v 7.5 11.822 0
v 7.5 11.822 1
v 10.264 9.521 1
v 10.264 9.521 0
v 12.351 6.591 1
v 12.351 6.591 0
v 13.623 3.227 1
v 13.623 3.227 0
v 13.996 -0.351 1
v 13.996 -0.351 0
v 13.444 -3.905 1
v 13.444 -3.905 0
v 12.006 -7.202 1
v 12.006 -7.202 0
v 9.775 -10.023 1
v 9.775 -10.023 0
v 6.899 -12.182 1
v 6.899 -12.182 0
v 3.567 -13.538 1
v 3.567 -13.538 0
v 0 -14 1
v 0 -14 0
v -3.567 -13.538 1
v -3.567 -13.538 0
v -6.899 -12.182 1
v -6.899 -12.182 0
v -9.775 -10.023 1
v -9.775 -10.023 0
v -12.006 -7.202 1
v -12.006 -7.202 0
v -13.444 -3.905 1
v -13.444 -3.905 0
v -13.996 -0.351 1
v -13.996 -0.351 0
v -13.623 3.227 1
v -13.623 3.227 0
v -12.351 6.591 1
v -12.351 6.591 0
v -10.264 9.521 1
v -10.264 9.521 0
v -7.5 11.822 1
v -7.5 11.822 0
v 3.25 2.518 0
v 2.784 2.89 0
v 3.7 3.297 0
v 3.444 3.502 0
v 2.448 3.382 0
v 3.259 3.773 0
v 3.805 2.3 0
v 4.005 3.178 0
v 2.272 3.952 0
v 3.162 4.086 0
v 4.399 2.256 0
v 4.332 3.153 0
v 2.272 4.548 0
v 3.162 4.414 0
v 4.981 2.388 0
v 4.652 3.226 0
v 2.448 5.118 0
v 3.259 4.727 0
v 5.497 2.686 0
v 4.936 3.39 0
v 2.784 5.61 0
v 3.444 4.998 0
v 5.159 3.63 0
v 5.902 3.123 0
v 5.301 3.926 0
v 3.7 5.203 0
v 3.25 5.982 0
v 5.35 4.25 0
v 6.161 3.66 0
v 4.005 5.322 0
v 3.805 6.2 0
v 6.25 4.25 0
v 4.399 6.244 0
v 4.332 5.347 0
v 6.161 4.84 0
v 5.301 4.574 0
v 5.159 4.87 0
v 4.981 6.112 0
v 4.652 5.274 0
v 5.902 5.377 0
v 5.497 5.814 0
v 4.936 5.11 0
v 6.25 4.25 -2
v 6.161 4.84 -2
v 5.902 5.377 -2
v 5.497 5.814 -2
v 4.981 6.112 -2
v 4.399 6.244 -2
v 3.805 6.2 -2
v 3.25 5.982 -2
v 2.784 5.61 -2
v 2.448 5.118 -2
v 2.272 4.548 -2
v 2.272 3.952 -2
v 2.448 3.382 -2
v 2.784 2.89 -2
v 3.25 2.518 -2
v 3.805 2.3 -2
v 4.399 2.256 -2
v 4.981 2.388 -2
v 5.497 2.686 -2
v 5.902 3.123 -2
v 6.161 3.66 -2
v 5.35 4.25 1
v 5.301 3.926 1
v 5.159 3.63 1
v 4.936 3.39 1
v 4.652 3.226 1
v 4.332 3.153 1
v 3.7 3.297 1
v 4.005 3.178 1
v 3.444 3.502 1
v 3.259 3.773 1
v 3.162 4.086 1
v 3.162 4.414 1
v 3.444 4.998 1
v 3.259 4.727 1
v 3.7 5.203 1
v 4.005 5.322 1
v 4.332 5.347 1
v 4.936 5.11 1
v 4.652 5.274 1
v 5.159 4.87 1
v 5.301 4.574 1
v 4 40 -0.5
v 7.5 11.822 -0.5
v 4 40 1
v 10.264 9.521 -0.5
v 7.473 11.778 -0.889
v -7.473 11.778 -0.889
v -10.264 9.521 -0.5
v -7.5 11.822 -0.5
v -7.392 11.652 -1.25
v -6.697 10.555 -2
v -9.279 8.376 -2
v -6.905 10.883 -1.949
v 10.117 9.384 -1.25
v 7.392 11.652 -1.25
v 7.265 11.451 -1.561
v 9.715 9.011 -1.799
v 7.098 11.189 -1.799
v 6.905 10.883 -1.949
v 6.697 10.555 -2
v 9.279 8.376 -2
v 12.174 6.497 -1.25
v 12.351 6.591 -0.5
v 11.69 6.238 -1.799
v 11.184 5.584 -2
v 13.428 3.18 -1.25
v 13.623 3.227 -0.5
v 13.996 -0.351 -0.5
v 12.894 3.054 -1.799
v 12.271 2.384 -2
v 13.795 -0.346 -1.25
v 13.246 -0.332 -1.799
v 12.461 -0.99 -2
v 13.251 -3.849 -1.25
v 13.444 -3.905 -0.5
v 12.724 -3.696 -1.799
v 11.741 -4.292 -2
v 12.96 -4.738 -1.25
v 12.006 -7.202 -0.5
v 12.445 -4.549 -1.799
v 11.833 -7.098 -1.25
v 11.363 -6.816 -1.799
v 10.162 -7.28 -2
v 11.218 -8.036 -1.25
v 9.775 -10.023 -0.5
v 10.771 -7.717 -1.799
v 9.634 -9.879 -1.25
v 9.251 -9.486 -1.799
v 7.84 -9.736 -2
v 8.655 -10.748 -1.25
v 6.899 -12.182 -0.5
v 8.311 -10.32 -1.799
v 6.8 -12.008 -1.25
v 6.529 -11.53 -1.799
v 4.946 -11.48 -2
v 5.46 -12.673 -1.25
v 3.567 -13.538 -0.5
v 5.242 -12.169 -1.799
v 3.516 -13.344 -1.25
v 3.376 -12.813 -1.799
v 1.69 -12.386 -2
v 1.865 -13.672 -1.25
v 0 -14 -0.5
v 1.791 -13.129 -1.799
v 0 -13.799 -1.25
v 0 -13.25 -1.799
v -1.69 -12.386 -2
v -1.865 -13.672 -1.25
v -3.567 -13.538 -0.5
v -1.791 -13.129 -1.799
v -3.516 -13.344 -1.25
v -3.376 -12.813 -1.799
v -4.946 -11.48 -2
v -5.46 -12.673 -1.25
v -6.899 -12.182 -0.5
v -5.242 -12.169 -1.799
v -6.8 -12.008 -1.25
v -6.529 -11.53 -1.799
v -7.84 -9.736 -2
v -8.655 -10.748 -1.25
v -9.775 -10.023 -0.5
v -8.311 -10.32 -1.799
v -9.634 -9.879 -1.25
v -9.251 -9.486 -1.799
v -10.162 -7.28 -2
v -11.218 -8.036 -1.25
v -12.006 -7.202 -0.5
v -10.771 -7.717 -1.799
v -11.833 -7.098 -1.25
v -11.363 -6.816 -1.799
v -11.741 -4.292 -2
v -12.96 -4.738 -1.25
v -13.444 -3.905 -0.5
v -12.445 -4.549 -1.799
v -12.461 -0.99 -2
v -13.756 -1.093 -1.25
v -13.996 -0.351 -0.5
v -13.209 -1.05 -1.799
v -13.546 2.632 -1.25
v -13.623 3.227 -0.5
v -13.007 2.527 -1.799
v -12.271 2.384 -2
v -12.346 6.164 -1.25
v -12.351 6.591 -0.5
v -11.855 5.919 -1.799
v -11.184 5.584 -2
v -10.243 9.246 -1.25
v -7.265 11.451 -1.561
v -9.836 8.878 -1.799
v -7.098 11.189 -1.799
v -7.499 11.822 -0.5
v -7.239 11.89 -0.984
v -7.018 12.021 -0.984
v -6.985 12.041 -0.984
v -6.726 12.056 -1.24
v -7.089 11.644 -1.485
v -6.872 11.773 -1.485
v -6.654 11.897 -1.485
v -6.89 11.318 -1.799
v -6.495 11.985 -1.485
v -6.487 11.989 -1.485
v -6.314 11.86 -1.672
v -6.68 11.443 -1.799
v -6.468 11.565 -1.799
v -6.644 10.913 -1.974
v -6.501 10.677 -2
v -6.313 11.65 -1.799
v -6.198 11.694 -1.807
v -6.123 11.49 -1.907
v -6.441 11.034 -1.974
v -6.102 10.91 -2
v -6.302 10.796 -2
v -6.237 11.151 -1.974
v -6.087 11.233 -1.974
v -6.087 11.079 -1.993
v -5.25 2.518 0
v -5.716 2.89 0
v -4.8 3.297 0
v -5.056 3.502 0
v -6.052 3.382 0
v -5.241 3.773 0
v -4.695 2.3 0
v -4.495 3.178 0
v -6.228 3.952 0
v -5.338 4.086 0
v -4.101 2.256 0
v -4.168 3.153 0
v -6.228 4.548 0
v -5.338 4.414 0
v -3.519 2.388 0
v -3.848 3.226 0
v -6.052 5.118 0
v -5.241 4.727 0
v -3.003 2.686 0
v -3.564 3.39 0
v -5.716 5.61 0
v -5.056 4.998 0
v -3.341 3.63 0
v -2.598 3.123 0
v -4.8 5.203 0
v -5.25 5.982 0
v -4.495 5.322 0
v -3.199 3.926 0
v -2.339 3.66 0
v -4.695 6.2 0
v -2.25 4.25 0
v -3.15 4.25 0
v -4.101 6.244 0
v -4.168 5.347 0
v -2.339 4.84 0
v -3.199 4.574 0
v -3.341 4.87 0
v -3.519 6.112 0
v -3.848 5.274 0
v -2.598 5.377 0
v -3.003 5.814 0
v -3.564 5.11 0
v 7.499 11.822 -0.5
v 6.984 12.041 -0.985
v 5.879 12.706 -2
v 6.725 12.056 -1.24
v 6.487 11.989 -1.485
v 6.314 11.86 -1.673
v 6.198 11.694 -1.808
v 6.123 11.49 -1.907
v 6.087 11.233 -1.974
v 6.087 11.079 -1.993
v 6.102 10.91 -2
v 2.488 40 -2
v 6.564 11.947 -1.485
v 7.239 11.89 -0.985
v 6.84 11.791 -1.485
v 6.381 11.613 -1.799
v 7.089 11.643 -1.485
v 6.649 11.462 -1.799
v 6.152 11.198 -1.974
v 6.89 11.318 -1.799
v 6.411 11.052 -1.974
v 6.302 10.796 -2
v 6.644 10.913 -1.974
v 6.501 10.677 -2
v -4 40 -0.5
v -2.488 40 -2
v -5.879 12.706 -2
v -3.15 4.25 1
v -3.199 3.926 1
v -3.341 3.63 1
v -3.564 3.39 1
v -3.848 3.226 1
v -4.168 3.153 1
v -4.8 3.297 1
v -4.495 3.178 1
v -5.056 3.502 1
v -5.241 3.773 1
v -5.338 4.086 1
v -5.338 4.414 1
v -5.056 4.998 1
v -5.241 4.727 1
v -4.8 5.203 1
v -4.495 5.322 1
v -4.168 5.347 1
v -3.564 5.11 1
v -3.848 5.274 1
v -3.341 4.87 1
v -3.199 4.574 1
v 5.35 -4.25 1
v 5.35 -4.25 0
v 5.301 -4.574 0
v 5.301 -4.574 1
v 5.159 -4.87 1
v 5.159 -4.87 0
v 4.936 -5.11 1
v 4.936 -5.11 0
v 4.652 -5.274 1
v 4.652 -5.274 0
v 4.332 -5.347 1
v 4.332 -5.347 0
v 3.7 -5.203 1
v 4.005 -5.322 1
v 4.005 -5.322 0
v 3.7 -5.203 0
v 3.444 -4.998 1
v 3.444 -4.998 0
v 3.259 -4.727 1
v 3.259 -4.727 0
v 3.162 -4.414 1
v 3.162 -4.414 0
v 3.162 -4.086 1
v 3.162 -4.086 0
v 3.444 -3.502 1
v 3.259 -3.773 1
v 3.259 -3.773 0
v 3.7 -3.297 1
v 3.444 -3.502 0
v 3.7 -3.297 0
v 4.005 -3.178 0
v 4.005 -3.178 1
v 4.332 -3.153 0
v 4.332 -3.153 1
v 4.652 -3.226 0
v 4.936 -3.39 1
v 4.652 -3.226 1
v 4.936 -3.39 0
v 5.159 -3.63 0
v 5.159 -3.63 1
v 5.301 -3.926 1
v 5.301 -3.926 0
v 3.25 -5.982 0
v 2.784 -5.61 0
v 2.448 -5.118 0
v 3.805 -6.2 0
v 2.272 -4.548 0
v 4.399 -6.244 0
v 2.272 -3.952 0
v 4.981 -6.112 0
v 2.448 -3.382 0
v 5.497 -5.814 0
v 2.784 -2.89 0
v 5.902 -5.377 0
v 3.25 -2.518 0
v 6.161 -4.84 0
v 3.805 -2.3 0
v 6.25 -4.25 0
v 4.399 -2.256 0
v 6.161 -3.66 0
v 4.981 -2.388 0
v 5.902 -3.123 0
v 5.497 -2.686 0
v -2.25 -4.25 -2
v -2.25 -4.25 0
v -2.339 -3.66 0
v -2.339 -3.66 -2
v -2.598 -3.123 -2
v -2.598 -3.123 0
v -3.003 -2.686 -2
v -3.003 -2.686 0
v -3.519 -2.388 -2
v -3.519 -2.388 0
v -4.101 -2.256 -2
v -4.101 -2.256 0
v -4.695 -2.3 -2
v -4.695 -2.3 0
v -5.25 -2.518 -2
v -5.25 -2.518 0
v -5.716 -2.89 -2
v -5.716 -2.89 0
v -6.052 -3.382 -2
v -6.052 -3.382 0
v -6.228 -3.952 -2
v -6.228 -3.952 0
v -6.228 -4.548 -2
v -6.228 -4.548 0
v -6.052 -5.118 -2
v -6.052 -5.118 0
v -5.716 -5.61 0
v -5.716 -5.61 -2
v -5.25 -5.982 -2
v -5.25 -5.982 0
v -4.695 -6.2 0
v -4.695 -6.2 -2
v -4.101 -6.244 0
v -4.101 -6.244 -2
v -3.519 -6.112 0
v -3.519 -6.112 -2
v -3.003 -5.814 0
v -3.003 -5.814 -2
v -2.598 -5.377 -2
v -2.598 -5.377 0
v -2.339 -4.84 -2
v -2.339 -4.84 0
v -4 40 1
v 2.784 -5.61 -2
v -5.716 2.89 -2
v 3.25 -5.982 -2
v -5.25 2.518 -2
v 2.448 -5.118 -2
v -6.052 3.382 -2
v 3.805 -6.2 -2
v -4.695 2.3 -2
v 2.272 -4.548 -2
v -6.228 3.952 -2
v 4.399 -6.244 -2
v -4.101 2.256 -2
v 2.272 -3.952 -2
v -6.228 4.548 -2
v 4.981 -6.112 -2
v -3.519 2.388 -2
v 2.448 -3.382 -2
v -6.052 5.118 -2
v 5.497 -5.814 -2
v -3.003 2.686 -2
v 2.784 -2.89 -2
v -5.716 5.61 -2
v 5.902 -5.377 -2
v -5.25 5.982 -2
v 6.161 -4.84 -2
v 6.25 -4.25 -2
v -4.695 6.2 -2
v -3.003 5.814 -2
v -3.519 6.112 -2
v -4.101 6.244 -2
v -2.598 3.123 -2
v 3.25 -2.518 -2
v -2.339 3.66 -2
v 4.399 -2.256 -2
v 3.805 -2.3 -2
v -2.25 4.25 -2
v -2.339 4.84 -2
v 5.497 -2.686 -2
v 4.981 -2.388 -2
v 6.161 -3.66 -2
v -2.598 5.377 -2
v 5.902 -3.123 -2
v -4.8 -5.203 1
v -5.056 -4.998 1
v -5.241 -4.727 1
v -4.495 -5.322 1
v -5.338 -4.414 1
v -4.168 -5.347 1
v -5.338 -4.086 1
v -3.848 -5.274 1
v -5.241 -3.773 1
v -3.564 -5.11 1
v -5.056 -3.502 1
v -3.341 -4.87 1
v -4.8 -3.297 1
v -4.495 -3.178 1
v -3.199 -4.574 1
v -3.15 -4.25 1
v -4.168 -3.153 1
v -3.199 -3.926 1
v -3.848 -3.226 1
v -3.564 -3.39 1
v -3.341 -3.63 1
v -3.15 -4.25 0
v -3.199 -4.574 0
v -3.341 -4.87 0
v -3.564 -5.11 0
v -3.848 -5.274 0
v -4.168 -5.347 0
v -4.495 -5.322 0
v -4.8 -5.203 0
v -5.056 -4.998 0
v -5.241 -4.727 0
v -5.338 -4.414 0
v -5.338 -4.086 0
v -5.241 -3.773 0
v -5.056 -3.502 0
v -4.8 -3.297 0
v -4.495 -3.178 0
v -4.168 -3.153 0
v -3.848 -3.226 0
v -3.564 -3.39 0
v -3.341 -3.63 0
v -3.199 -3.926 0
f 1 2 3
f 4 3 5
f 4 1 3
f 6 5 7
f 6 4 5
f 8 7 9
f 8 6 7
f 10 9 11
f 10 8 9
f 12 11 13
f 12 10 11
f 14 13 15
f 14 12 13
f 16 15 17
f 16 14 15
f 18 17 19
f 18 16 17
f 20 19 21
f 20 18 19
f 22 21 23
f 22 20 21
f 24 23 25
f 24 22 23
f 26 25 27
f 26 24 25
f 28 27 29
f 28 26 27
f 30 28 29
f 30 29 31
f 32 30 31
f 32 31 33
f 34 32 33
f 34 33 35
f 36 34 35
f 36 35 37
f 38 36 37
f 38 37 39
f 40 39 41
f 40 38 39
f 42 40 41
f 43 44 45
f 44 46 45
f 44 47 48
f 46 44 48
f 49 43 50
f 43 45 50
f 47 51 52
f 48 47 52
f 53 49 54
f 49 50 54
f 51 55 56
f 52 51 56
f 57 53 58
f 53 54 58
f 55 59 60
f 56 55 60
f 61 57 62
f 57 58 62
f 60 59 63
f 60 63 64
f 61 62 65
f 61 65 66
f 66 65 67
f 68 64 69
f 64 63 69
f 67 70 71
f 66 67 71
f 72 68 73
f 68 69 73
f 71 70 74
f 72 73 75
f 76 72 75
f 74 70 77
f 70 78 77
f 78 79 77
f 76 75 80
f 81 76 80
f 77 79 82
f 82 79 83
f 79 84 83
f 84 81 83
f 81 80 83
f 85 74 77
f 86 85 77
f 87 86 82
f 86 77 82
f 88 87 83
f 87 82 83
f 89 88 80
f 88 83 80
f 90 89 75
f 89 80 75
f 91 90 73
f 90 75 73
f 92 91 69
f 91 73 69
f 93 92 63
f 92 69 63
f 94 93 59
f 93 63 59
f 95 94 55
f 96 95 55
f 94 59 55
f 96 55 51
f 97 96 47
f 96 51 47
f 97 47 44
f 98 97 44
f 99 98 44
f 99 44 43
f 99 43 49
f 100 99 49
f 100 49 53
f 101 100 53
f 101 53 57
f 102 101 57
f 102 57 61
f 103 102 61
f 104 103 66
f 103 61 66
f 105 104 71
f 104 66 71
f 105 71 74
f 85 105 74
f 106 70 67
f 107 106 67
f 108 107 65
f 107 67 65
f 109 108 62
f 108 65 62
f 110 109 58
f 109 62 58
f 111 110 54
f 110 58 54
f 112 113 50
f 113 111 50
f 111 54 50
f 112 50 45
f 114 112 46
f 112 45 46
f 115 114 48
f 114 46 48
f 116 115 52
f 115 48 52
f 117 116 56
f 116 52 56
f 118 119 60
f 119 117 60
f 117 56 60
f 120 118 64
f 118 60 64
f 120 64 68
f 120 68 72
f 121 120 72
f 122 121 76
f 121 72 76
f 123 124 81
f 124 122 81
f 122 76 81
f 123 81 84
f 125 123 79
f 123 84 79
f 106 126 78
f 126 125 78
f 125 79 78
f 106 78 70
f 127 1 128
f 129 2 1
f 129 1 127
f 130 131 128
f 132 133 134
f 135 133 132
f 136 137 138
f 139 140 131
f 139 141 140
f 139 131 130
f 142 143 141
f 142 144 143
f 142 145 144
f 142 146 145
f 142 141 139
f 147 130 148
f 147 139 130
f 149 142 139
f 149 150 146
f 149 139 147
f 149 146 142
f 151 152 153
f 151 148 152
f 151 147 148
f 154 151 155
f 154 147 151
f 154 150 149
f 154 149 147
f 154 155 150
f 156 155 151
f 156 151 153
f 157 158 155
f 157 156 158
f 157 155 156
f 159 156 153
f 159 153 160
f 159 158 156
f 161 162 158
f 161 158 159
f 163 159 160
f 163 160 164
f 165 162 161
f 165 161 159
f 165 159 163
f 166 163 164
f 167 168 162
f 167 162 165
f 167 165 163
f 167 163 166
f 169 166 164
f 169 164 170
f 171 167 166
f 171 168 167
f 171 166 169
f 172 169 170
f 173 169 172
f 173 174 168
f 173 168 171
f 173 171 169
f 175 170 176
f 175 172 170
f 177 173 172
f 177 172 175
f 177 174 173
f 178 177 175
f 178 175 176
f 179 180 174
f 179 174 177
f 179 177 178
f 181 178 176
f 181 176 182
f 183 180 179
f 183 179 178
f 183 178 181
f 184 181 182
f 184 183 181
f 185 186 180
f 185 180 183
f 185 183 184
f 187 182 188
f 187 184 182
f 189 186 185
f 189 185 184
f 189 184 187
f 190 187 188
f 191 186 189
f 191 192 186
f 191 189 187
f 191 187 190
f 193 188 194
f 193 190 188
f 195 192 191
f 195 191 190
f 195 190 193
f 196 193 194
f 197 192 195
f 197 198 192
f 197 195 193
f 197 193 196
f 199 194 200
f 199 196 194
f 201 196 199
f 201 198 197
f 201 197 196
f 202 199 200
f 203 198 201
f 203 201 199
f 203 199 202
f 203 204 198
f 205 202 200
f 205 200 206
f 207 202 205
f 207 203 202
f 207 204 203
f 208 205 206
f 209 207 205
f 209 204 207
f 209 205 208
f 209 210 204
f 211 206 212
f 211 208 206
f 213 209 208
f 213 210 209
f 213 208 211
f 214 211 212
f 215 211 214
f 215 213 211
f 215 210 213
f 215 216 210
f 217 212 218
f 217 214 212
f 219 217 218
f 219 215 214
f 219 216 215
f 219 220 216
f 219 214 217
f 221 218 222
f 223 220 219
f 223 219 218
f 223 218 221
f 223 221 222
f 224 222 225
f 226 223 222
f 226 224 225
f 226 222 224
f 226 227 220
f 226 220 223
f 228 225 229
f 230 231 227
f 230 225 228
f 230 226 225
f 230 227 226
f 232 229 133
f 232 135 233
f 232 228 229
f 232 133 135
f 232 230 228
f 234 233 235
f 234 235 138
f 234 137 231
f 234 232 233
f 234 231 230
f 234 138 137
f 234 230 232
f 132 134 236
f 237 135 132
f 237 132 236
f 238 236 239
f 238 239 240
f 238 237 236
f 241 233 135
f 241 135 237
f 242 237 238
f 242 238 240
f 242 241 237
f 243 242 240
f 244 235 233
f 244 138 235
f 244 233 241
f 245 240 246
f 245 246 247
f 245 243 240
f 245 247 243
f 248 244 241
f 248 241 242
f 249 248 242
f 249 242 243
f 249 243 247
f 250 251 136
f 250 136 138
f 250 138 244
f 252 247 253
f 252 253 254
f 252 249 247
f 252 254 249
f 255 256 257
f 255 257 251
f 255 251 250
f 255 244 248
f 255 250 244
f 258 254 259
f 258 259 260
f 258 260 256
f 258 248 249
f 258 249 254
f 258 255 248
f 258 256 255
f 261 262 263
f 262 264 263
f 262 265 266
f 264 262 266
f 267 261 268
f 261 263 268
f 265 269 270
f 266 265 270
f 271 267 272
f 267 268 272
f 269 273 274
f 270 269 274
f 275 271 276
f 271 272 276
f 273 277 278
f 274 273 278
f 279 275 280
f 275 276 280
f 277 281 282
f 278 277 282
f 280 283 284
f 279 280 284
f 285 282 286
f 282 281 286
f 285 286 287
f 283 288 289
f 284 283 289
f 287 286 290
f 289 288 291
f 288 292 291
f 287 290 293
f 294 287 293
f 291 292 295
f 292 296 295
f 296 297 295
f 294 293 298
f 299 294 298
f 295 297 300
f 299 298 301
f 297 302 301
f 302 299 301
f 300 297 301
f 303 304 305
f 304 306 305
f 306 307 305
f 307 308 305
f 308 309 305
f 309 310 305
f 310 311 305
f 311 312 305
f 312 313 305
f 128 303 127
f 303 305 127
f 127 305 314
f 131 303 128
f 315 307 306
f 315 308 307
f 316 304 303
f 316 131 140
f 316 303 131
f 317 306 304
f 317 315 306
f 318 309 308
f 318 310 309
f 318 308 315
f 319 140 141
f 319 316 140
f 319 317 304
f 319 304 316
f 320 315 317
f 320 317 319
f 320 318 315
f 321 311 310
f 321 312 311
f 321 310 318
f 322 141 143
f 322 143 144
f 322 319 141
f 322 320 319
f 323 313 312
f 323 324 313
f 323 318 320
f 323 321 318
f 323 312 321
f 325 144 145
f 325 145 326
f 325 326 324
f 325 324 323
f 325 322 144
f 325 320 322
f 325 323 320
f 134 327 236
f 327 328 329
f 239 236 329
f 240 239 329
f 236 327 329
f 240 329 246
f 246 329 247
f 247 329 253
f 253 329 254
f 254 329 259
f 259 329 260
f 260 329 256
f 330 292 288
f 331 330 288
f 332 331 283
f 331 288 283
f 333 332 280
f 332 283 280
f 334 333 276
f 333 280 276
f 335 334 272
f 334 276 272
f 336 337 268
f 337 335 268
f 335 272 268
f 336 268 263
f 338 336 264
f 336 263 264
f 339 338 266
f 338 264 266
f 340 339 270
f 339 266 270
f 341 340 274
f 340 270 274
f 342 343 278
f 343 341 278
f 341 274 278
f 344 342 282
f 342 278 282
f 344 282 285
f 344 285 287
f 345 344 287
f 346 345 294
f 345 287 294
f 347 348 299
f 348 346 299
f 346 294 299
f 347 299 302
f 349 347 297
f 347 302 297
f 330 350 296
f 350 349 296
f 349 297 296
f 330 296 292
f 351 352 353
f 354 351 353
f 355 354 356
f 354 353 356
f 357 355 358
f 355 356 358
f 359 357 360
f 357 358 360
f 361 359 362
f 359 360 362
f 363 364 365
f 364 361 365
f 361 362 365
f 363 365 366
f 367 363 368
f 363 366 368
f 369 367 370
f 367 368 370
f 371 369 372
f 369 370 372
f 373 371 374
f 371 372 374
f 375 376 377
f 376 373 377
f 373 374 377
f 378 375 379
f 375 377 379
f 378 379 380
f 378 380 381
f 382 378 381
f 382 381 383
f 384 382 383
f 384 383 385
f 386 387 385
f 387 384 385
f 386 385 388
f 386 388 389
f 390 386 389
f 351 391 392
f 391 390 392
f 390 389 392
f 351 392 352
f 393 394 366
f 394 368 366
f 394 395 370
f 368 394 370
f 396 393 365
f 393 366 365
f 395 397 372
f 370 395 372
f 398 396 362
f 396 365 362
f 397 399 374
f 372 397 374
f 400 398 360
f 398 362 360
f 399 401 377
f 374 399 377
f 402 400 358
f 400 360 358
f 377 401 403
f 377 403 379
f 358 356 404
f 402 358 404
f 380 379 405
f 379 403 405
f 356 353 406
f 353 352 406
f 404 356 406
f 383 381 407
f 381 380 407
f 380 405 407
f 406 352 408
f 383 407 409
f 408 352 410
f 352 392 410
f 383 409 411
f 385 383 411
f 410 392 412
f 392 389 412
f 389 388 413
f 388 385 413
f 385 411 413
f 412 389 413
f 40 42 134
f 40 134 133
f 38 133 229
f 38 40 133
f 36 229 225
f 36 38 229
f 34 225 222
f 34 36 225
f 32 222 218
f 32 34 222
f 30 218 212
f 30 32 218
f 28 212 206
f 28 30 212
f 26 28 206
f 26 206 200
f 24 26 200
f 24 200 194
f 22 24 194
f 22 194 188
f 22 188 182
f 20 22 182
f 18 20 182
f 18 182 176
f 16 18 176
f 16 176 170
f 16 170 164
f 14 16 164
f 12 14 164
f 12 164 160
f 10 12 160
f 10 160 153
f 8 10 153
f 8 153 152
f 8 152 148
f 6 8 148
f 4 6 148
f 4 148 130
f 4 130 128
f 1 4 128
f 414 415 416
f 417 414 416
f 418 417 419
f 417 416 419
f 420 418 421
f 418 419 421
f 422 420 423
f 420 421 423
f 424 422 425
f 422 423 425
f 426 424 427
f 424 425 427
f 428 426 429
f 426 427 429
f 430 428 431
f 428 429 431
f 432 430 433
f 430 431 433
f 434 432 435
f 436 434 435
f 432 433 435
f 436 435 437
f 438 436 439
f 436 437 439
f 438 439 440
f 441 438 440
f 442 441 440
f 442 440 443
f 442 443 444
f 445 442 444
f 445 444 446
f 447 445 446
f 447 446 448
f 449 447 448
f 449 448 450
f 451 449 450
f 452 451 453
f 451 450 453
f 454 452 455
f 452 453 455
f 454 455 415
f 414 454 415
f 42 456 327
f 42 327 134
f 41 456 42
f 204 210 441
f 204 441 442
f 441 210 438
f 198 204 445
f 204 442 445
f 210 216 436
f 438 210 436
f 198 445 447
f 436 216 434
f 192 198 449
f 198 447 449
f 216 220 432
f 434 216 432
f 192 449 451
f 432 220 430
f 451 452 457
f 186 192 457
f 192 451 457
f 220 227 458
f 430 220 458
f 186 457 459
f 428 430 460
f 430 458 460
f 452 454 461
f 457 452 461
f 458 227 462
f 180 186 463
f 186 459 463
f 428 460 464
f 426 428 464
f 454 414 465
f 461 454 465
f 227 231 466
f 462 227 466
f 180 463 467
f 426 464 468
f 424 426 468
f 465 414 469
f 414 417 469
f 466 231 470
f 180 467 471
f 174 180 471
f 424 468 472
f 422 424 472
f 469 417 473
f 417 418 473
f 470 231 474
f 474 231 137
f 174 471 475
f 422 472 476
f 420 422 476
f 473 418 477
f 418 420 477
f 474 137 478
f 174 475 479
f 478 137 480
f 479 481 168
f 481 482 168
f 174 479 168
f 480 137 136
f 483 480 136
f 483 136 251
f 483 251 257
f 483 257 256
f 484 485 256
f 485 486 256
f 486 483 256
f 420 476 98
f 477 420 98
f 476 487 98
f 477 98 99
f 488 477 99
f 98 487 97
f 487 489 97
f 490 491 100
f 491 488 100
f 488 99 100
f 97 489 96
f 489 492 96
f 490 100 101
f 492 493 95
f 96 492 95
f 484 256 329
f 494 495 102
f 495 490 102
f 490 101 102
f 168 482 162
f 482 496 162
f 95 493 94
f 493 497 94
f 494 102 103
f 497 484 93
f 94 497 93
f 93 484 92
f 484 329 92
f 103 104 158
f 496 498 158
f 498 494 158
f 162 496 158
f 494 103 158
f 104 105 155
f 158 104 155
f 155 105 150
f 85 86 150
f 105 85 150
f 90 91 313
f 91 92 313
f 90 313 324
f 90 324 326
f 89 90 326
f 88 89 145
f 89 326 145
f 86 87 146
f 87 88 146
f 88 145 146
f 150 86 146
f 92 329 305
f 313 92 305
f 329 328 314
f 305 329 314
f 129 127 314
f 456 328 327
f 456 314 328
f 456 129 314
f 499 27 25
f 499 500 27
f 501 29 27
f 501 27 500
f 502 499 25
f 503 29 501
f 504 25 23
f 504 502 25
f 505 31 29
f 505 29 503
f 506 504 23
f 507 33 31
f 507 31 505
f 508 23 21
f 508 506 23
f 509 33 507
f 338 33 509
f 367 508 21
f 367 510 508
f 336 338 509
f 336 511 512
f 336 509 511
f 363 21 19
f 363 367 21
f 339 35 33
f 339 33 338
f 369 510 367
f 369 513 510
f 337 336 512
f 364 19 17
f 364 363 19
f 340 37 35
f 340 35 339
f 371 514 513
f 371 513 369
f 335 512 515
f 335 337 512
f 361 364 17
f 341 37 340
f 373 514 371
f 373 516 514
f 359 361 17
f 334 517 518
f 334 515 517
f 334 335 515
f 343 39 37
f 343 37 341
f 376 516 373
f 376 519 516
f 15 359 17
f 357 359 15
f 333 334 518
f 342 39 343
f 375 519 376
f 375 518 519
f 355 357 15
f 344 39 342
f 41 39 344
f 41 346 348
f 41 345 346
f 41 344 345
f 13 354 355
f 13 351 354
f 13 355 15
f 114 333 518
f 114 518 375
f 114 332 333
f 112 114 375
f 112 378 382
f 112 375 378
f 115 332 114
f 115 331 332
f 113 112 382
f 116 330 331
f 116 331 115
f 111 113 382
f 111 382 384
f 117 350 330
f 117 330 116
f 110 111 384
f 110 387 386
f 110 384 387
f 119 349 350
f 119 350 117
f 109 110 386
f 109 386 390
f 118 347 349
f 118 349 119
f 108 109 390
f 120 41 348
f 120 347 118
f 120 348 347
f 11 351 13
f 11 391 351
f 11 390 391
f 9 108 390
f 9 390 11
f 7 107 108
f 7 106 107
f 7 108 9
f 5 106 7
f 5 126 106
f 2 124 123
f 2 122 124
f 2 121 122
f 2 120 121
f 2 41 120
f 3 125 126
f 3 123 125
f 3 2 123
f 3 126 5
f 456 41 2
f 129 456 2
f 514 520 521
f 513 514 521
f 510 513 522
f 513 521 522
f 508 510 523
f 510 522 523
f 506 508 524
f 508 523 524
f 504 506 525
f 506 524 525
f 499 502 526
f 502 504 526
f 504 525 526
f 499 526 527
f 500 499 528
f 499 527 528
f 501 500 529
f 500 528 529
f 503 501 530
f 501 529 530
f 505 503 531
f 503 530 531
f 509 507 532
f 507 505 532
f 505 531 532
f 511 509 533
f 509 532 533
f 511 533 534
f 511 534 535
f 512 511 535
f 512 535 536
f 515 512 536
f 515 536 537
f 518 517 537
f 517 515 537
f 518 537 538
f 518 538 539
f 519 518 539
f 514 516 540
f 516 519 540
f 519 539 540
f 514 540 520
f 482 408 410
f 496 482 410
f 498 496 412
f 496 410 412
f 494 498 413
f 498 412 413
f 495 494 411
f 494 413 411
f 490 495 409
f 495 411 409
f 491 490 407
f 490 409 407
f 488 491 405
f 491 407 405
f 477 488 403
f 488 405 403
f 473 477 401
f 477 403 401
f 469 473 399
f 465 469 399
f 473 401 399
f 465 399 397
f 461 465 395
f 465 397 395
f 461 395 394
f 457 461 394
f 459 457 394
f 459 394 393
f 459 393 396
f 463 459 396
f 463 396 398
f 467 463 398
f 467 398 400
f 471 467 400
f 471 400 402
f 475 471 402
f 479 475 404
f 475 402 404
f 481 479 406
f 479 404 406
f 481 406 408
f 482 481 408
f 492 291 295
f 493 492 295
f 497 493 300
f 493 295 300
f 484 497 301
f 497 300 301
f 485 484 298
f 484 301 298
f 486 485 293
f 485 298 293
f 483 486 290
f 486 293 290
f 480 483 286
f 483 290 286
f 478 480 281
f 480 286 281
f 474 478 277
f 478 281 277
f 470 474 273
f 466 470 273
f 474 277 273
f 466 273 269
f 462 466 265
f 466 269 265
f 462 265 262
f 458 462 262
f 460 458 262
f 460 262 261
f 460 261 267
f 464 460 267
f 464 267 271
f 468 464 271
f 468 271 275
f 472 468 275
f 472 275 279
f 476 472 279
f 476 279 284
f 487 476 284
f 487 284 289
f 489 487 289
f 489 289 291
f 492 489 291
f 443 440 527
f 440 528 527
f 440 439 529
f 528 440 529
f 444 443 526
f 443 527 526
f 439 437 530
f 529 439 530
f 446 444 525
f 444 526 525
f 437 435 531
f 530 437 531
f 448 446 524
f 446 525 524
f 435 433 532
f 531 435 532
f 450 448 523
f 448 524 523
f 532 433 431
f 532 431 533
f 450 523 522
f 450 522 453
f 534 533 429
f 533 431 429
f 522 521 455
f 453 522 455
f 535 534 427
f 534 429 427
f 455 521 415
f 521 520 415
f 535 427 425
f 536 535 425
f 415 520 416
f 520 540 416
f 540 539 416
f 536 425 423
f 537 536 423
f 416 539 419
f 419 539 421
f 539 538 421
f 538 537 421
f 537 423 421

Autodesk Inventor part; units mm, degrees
ref_plane "YZ Plane" through (0, 0, 0) normal (1, 0, 0) x (0, 1, 0)
ref_plane "XZ Plane" through (0, 0, 0) normal (0, 1, 0) x (-1, 0, 0)
ref_plane "XY Plane" through (0, 0, 0) normal (0, 0, 1) x (1, 0, 0)
sketch "Sketch1" plane through (0, 0, 0) normal (0, 0, 1) x (1, 0, 0)
  circle A0 centre (0, 0) radius 14
  circle A1 centre (-4.25, 4.25) radius 1.1
  circle A2 centre (-4.25, -4.25) radius 1.1
  circle A3 centre (4.25, -4.25) radius 1.1
  circle A4 centre (4.25, 4.25) radius 1.1
  line L0 (-7.5, 11.8216) -> (-4, 40)
  line L1 (-4, 40) -> (4, 40)
  line L2 (4, 40) -> (7.5, 11.8216)
  point P0 (0, 40)
  dimension "d0" = 8.5
  dimension "d1" = 8.5
  dimension "d2" = 4.25
  dimension "d3" = 4.25
  dimension "d4" = 2.2
  dimension "d5" = 28
  dimension "d6" = 8
  dimension "d7" = 15
  dimension "d8" = 40
extrude "Extrusion1" add sketch "Sketch1" along normal blind 1
sketch "Sketch2" plane through (0, 0, 0) normal (0, 0, 1) x (1, 0, 0)
  line L0 (7.5, 11.8216) -> (4, 40) projected
  line L1 (4, 40) -> (-4, 40) projected
  line L2 (-4, 40) -> (-7.5, 11.8216) projected
  arc A0 (-7.5, 11.8216) -> (7.5, 11.8216) centre (0, 0) ccw projected
  circle A1 centre (-4.25, 4.25) radius 1.1 projected
  circle A2 centre (-4.25, -4.25) radius 1.1 projected
  circle A3 centre (4.25, -4.25) radius 1.1 projected
  circle A4 centre (4.25, 4.25) radius 1.1 projected
  circle A5 centre (-4.25, 4.25) radius 2
  circle A6 centre (-4.25, -4.25) radius 1.1 projected
  circle A7 centre (-4.25, -4.25) radius 2
  circle A8 centre (4.25, -4.25) radius 1.1 projected
  circle A9 centre (4.25, -4.25) radius 2
  circle A10 centre (4.25, 4.25) radius 2
  dimension "d11" = 4
extrude "Extrusion2" add sketch "Sketch2" against normal blind 2 contours A0 L2 L1 L0
chamfer "Chamfer1" distance 1.5 angle 45 2 edges at (-5.75, 25.9108, -2) (5.75, 25.9108, -2)
fillet "Fillet1" radius 1.5 1 edges at (0, -14, -2)
equation "\"d1\" = d0"
equation "\"d2\" = 0.5 * d1"
equation "\"d3\" = 0.5 * d0"
properties part number "Pointerlever"
